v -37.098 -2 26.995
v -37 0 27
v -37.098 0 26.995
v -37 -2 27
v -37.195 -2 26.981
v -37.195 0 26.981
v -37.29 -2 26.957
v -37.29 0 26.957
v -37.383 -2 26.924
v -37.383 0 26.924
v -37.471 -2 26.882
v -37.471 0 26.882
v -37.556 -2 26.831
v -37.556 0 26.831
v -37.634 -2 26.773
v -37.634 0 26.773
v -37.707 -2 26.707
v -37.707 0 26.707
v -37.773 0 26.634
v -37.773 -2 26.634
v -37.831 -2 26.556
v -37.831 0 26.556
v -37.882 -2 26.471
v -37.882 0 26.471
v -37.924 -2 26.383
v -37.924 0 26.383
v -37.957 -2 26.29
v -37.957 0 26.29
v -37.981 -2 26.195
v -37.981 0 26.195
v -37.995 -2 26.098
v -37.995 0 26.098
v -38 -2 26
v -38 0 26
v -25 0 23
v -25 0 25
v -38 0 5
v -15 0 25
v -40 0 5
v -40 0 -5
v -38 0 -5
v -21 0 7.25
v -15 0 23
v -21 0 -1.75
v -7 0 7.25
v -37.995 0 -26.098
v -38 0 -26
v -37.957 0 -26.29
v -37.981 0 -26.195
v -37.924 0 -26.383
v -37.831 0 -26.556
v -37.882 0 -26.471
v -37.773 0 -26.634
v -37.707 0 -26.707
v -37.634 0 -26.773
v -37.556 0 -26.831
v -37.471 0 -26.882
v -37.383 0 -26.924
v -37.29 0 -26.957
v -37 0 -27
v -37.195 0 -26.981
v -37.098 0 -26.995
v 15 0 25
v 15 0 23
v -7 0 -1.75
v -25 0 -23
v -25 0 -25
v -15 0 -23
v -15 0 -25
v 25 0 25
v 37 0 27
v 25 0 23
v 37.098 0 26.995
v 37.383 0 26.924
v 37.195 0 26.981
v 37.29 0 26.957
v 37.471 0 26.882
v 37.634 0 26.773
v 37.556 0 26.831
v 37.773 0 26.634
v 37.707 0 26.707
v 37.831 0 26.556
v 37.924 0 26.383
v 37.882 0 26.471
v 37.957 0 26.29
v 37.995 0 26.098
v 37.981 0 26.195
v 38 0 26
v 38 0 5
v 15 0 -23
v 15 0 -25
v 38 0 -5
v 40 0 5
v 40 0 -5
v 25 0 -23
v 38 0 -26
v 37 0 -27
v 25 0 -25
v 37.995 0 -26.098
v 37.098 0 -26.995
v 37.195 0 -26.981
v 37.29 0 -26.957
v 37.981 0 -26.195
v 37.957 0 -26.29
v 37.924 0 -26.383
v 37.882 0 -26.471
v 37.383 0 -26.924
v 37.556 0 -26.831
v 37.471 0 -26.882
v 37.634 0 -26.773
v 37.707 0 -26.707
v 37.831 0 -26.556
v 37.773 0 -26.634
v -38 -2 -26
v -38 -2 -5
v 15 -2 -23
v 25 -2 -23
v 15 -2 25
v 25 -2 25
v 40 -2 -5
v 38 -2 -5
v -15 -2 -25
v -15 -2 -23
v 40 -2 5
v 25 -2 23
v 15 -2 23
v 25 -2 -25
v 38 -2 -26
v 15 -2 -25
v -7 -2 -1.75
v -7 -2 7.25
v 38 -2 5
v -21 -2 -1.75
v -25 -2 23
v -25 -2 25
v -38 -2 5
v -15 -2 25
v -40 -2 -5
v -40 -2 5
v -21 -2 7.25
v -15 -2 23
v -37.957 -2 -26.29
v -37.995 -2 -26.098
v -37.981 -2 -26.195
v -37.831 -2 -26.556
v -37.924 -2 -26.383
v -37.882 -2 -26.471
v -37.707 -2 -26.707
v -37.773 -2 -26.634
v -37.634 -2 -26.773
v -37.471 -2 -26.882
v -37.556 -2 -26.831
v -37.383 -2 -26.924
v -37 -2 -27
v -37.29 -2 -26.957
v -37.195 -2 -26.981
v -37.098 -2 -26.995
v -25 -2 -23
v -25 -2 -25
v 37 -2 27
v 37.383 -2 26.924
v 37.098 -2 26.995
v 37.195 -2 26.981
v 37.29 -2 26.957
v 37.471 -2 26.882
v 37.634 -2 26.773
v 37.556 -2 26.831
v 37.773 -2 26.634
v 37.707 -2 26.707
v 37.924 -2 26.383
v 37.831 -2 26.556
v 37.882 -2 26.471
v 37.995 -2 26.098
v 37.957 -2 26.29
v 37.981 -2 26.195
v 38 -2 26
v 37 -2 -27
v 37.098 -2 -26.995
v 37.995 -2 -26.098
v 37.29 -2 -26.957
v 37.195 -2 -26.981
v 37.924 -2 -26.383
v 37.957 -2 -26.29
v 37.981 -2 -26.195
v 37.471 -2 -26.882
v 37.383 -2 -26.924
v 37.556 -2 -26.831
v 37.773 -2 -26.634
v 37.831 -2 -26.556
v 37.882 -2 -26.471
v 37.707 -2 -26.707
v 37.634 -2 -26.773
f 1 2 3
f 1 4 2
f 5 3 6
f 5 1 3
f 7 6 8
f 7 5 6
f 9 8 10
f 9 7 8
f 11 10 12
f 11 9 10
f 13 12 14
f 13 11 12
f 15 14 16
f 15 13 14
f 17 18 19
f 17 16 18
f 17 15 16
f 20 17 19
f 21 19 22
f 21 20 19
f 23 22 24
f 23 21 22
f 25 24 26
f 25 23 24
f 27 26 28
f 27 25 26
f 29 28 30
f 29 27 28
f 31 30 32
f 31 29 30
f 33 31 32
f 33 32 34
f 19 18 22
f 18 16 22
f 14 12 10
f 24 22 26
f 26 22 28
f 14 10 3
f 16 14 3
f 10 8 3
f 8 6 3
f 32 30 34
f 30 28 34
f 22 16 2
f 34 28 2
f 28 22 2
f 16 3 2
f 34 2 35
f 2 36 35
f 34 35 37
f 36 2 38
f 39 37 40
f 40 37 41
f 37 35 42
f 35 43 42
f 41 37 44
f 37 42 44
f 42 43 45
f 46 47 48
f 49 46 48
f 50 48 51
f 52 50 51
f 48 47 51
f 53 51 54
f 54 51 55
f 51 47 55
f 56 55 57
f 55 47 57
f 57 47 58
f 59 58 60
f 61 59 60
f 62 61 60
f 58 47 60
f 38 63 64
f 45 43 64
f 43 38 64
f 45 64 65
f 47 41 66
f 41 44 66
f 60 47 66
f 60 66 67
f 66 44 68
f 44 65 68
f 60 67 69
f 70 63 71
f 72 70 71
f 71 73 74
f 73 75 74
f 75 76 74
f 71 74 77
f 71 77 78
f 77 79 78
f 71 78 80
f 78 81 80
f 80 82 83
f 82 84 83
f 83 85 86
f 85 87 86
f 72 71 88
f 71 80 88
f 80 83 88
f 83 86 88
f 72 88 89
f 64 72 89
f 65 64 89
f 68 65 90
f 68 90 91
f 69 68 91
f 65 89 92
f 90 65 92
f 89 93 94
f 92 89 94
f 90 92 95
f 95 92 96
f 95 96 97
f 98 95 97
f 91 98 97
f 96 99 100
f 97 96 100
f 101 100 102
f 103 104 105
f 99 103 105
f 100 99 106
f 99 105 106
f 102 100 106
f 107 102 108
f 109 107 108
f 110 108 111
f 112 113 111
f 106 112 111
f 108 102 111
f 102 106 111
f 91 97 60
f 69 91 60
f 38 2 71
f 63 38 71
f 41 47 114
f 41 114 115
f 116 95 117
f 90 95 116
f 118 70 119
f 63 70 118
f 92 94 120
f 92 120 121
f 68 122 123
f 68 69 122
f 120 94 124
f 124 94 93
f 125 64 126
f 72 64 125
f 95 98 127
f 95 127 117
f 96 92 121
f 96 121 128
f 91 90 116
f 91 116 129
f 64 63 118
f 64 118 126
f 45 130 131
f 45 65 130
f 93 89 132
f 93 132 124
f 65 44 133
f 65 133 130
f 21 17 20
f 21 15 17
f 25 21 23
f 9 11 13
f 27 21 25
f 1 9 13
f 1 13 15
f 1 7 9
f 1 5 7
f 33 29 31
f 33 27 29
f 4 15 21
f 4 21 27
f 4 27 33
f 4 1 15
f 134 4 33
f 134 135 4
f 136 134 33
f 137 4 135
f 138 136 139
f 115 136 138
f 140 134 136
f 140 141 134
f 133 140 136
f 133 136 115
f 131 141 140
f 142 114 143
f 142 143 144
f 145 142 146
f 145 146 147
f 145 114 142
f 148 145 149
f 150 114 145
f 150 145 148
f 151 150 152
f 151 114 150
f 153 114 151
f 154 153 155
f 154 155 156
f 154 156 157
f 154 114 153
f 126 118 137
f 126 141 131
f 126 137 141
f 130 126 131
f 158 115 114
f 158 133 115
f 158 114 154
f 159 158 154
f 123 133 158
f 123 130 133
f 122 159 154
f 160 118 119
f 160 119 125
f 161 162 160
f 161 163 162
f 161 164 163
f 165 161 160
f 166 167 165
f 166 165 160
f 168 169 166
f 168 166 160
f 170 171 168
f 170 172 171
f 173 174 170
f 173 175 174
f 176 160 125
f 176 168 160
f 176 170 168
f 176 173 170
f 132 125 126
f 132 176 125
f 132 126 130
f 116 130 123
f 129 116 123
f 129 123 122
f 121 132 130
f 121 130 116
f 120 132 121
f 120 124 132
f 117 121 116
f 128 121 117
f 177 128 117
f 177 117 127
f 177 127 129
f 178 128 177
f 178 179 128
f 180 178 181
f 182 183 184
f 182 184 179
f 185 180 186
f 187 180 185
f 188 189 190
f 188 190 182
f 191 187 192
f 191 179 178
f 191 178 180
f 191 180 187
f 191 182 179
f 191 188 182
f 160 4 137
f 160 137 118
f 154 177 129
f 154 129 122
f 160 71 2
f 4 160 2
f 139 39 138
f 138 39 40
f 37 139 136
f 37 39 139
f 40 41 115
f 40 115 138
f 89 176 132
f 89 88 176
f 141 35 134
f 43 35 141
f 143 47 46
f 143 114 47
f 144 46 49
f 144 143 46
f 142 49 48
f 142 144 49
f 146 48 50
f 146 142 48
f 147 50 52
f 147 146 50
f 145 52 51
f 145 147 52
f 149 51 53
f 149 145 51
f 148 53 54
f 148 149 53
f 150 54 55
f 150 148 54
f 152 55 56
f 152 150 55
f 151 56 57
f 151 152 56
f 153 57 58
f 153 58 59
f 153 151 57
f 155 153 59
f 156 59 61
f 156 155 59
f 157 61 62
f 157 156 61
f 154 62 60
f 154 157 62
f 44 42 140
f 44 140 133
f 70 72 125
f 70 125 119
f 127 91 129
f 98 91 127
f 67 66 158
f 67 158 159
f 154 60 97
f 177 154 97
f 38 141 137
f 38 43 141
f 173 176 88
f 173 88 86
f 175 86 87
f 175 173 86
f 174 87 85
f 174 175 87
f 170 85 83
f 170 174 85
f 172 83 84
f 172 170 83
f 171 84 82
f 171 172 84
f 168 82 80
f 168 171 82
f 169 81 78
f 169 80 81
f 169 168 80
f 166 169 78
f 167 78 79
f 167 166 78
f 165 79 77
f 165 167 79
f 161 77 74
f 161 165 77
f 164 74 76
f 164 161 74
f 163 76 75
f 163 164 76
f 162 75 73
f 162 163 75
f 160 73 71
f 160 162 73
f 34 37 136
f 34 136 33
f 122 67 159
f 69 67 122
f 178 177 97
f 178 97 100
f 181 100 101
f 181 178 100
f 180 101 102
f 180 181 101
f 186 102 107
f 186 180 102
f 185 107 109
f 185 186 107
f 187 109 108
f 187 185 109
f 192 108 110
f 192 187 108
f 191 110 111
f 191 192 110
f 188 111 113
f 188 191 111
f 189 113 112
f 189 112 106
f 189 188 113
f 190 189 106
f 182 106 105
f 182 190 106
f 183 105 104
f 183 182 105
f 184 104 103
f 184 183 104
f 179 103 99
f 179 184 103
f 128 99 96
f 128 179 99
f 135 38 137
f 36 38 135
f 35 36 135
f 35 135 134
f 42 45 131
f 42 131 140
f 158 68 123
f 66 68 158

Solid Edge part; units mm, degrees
sketch "Sketch1" plane through (0, 0, 0) normal (0, -1, 0) x (1, 0, 0)
  line L0 (40, -27) -> (40, 27)
  line L1 (40, 27) -> (-40, 27)
  line L2 (-40, 27) -> (-40, -27)
  line L3 (-40, -27) -> (40, -27)
extrude "Protrusion1" add sketch "Sketch1" along normal blind 2
sketch "Sketch2" plane through (0, 0, 0) normal (0, -1, 0) x (1, 0, 0)
  line L0 (-25, 23) -> (-15, 23)
  line L1 (-15, 23) -> (-15, 25)
  line L2 (-15, 25) -> (-25, 25)
  line L3 (-25, 25) -> (-25, 23)
extrude "ExtrudedCutout_1" cut sketch "Sketch2" along normal blind 2
sketch "Sketch3" plane through (0, 0, 0) normal (0, -1, 0) x (1, 0, 0)
  line L0 (25, 25) -> (15, 25)
  line L1 (15, 25) -> (15, 23)
  line L2 (15, 23) -> (25, 23)
  line L3 (25, 23) -> (25, 25)
extrude "ExtrudedCutout_2" cut sketch "Sketch3" along normal blind 2
sketch "Sketch4" plane through (0, 0, 0) normal (0, -1, 0) x (1, 0, 0)
  line L0 (15, -25) -> (25, -25)
  line L1 (25, -25) -> (25, -23)
  line L2 (25, -23) -> (15, -23)
  line L3 (15, -23) -> (15, -25)
extrude "ExtrudedCutout_3" cut sketch "Sketch4" along normal blind 2
sketch "Sketch5" plane through (0, 0, 0) normal (0, -1, 0) x (1, 0, 0)
  line L0 (-15, -23) -> (-25, -23)
  line L1 (-25, -23) -> (-25, -25)
  line L2 (-25, -25) -> (-15, -25)
  line L3 (-15, -25) -> (-15, -23)
extrude "ExtrudedCutout_4" cut sketch "Sketch5" along normal blind 2
sketch "Sketch6" plane through (0, 0, 0) normal (0, -1, 0) x (1, 0, 0)
  line L0 (-38, -27) -> (-38, -5)
  line L1 (-38, -5) -> (-40, -5)
  line L2 (-40, -5) -> (-40, -27)
  line L3 (-40, -27) -> (-38, -27)
extrude "ExtrudedCutout_5" cut sketch "Sketch6" along normal blind 2
sketch "Sketch7" plane through (0, 0, 0) normal (0, -1, 0) x (1, 0, 0)
  line L0 (-38, 5) -> (-38, 27)
  line L1 (-38, 27) -> (-40, 27)
  line L2 (-40, 27) -> (-40, 5)
  line L3 (-40, 5) -> (-38, 5)
extrude "ExtrudedCutout_6" cut sketch "Sketch7" along normal blind 2
sketch "Sketch8" plane through (0, 0, 0) normal (0, -1, 0) x (1, 0, 0)
  line L0 (38, -5) -> (38, -27)
  line L1 (38, -27) -> (40, -27)
  line L2 (40, -27) -> (40, -5)
  line L3 (40, -5) -> (38, -5)
extrude "ExtrudedCutout_7" cut sketch "Sketch8" along normal blind 2
sketch "Sketch9" plane through (0, 0, 0) normal (0, -1, 0) x (1, 0, 0)
  line L0 (38, 27) -> (38, 5)
  line L1 (38, 5) -> (40, 5)
  line L2 (40, 5) -> (40, 27)
  line L3 (40, 27) -> (38, 27)
extrude "ExtrudedCutout_8" cut sketch "Sketch9" along normal blind 2
sketch "Sketch10" plane through (0, 0, 0) normal (0, -1, 0) x (1, 0, 0)
  line L0 (-21, -1.75) -> (-7, -1.75)
  line L1 (-7, -1.75) -> (-7, 7.25)
  line L2 (-7, 7.25) -> (-21, 7.25)
  line L3 (-21, 7.25) -> (-21, -1.75)
extrude "ExtrudedCutout_9" cut sketch "Sketch10" along normal blind 2
fillet "Round_1" radius 1 4 edges at (-38, -1, -27) (-38, -1, 27) (38, -1, 27) (38, -1, -27)
properties material "Acrylic, high impact grade"
